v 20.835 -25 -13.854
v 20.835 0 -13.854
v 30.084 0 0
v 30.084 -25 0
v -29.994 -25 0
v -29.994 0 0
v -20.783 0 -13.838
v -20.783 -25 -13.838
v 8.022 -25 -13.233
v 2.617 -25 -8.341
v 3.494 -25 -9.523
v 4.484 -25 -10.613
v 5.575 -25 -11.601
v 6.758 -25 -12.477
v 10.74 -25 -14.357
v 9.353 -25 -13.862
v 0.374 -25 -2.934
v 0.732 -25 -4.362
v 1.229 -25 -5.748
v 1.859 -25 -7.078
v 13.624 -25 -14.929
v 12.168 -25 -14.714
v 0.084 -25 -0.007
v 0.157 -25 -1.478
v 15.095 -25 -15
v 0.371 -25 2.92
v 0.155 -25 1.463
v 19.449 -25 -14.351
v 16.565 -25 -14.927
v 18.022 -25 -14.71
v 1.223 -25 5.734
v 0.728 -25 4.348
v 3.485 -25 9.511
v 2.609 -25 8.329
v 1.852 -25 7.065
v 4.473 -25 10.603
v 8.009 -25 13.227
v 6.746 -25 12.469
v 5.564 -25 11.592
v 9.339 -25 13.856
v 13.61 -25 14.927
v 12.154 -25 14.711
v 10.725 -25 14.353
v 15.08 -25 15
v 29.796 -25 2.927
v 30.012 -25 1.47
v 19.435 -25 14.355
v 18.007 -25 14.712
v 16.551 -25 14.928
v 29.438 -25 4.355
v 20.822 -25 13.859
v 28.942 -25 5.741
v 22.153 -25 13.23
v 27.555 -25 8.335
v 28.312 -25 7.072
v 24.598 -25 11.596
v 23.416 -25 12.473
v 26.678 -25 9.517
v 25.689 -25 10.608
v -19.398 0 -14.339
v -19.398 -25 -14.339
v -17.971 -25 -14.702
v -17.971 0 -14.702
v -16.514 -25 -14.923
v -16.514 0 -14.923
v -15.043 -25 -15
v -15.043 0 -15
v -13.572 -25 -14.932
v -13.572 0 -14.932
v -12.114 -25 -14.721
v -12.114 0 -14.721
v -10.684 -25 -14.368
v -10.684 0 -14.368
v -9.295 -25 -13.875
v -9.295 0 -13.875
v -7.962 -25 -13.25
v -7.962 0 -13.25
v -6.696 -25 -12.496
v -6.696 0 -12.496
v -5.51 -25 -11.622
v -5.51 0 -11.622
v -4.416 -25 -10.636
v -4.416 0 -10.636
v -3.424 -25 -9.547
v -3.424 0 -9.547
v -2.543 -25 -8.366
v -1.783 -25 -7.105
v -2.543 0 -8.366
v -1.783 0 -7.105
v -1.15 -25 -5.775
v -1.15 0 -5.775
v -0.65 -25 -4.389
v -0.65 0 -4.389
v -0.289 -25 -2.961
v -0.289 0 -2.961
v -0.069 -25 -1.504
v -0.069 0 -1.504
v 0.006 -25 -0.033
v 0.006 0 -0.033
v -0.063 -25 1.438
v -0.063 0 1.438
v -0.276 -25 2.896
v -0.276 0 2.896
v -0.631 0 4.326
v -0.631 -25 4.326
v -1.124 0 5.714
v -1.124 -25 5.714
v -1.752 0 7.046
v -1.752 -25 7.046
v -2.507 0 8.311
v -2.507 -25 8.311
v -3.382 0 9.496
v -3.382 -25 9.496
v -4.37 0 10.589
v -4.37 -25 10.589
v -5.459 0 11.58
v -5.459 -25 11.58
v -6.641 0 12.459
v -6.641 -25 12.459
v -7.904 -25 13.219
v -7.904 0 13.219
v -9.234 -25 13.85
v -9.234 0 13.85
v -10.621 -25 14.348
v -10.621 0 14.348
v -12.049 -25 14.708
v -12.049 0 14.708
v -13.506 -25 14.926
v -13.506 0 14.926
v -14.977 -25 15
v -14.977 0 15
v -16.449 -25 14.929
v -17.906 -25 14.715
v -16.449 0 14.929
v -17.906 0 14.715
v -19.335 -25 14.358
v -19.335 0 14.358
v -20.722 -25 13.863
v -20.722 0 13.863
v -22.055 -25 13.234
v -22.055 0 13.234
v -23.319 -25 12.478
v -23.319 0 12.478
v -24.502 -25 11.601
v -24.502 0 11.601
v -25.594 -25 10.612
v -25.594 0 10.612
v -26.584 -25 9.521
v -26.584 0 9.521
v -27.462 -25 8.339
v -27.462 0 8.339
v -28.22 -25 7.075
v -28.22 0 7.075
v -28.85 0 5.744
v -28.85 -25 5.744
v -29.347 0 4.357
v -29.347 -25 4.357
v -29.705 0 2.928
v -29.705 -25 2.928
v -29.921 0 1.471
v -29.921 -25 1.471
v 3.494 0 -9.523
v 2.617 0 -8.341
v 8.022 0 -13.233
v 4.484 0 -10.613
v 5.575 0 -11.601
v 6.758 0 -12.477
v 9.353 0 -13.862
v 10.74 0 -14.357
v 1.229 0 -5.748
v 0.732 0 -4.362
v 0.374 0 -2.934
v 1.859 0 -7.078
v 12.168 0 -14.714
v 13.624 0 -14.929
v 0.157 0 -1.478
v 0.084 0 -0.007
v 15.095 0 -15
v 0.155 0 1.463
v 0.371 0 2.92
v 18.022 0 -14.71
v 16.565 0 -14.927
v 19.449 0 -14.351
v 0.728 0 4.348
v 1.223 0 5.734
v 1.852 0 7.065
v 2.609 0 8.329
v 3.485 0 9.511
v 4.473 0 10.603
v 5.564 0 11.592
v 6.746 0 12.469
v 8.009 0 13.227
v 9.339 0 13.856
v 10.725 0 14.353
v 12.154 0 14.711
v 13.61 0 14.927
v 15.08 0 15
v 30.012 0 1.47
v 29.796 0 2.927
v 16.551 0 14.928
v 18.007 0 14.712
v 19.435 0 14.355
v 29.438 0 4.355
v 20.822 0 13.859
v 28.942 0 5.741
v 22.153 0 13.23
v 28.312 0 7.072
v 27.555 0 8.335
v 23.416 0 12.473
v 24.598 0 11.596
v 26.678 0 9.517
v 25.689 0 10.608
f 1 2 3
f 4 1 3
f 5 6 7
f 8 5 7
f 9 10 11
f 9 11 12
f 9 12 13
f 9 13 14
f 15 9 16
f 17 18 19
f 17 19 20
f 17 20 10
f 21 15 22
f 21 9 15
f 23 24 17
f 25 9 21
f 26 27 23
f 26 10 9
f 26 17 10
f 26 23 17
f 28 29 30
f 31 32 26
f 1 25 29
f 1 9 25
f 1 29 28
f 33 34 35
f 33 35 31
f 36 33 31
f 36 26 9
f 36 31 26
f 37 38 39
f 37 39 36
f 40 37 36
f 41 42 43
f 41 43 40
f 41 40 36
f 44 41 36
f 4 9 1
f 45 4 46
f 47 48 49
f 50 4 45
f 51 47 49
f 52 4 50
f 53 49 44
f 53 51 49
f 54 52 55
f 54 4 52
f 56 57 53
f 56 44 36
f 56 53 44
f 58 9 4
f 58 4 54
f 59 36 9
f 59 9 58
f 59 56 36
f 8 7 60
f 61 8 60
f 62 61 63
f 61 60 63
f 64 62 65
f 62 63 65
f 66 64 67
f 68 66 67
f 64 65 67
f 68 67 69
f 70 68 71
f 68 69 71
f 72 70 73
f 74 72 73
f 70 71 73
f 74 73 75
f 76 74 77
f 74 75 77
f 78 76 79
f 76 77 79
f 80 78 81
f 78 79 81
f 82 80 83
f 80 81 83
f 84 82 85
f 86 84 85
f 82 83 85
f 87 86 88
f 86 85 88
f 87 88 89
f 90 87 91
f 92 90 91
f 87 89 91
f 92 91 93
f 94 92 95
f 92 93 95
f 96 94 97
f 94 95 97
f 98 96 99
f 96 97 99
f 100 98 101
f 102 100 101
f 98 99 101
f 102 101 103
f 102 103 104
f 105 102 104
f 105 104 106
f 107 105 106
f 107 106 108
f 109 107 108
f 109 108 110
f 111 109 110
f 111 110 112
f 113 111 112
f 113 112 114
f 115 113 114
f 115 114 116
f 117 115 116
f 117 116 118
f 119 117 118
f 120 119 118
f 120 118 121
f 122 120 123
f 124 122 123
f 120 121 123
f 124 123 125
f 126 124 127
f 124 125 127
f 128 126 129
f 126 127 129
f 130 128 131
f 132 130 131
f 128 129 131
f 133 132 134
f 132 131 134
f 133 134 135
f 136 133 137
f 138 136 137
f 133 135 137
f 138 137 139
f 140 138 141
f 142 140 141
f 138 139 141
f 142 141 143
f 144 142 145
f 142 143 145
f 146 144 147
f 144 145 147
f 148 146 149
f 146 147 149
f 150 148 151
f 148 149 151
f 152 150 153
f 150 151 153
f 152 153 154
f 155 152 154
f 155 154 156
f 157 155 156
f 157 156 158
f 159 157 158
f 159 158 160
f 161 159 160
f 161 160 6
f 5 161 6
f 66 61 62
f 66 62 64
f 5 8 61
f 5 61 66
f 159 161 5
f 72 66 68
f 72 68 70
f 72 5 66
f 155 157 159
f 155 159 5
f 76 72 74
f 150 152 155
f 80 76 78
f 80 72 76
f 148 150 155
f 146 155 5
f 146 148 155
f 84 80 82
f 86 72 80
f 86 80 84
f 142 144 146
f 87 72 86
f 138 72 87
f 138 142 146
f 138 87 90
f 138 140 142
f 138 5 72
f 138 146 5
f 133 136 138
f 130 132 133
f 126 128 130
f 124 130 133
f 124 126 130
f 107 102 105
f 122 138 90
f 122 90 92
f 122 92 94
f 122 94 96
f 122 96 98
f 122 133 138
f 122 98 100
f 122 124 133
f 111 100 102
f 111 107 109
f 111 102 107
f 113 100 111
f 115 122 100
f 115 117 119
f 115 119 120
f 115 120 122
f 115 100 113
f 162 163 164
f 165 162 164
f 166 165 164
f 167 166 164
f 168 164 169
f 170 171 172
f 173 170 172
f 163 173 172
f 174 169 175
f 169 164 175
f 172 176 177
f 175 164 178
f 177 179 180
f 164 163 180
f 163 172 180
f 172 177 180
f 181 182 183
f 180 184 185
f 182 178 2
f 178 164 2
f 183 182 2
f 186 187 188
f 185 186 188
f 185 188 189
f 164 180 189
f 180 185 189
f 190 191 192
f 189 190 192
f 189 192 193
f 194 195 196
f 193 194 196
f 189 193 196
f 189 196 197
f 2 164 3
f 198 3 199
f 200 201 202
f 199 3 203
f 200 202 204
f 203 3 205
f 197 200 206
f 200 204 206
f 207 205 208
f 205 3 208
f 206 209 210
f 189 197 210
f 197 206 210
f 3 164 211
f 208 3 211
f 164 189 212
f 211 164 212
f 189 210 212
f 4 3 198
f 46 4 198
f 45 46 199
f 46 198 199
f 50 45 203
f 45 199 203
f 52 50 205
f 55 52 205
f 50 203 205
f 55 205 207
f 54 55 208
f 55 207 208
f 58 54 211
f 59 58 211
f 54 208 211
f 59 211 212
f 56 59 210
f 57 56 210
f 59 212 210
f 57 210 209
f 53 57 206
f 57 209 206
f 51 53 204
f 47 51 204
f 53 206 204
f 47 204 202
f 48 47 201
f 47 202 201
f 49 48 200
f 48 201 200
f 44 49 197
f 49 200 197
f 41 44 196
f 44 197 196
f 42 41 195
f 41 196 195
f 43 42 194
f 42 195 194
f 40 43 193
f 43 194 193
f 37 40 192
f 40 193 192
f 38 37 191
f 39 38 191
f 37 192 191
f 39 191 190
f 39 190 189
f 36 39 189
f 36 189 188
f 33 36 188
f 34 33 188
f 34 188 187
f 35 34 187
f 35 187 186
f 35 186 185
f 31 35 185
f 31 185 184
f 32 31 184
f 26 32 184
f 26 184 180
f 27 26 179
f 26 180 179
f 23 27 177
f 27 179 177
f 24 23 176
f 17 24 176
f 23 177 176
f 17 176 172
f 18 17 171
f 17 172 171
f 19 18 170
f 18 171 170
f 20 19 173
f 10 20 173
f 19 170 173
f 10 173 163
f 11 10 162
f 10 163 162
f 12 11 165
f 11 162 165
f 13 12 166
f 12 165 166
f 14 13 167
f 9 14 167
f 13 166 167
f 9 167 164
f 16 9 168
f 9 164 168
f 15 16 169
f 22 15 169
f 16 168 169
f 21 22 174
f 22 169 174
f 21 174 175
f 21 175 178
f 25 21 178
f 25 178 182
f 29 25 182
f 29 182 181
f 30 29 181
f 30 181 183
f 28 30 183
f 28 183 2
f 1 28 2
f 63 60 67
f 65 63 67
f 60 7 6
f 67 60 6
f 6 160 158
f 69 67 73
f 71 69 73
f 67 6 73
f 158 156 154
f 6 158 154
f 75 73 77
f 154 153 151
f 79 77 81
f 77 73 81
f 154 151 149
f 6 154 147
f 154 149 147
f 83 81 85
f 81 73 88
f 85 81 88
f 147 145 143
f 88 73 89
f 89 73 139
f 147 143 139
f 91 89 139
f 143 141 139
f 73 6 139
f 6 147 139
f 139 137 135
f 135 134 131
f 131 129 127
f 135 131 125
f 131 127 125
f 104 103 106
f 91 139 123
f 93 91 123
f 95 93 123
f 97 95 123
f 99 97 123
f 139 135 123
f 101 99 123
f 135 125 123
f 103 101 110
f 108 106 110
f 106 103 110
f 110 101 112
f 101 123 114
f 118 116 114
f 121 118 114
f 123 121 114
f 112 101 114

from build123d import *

# Parameters (mm, degrees)
F1_DEPTH = 25


with BuildPart() as f1:
    # F0 (on Front) → F1 (new body)
    with BuildSketch(Plane.XZ):
        with BuildLine():
            Line((-29.993658, 0), (-20.783397, -13.837591))
            ThreePointArc((-20.783397, -13.837591), (-2.506744, 8.311255), (-29.993658, 0))
        make_face()
        with BuildLine():
            ThreePointArc((30.083929, 0), (2.608554, 8.328566), (20.835262, -13.853598))
            Line((20.835262, -13.853598), (30.083929, 0))
        make_face()
    extrude(amount=F1_DEPTH)


solid = f1.part
